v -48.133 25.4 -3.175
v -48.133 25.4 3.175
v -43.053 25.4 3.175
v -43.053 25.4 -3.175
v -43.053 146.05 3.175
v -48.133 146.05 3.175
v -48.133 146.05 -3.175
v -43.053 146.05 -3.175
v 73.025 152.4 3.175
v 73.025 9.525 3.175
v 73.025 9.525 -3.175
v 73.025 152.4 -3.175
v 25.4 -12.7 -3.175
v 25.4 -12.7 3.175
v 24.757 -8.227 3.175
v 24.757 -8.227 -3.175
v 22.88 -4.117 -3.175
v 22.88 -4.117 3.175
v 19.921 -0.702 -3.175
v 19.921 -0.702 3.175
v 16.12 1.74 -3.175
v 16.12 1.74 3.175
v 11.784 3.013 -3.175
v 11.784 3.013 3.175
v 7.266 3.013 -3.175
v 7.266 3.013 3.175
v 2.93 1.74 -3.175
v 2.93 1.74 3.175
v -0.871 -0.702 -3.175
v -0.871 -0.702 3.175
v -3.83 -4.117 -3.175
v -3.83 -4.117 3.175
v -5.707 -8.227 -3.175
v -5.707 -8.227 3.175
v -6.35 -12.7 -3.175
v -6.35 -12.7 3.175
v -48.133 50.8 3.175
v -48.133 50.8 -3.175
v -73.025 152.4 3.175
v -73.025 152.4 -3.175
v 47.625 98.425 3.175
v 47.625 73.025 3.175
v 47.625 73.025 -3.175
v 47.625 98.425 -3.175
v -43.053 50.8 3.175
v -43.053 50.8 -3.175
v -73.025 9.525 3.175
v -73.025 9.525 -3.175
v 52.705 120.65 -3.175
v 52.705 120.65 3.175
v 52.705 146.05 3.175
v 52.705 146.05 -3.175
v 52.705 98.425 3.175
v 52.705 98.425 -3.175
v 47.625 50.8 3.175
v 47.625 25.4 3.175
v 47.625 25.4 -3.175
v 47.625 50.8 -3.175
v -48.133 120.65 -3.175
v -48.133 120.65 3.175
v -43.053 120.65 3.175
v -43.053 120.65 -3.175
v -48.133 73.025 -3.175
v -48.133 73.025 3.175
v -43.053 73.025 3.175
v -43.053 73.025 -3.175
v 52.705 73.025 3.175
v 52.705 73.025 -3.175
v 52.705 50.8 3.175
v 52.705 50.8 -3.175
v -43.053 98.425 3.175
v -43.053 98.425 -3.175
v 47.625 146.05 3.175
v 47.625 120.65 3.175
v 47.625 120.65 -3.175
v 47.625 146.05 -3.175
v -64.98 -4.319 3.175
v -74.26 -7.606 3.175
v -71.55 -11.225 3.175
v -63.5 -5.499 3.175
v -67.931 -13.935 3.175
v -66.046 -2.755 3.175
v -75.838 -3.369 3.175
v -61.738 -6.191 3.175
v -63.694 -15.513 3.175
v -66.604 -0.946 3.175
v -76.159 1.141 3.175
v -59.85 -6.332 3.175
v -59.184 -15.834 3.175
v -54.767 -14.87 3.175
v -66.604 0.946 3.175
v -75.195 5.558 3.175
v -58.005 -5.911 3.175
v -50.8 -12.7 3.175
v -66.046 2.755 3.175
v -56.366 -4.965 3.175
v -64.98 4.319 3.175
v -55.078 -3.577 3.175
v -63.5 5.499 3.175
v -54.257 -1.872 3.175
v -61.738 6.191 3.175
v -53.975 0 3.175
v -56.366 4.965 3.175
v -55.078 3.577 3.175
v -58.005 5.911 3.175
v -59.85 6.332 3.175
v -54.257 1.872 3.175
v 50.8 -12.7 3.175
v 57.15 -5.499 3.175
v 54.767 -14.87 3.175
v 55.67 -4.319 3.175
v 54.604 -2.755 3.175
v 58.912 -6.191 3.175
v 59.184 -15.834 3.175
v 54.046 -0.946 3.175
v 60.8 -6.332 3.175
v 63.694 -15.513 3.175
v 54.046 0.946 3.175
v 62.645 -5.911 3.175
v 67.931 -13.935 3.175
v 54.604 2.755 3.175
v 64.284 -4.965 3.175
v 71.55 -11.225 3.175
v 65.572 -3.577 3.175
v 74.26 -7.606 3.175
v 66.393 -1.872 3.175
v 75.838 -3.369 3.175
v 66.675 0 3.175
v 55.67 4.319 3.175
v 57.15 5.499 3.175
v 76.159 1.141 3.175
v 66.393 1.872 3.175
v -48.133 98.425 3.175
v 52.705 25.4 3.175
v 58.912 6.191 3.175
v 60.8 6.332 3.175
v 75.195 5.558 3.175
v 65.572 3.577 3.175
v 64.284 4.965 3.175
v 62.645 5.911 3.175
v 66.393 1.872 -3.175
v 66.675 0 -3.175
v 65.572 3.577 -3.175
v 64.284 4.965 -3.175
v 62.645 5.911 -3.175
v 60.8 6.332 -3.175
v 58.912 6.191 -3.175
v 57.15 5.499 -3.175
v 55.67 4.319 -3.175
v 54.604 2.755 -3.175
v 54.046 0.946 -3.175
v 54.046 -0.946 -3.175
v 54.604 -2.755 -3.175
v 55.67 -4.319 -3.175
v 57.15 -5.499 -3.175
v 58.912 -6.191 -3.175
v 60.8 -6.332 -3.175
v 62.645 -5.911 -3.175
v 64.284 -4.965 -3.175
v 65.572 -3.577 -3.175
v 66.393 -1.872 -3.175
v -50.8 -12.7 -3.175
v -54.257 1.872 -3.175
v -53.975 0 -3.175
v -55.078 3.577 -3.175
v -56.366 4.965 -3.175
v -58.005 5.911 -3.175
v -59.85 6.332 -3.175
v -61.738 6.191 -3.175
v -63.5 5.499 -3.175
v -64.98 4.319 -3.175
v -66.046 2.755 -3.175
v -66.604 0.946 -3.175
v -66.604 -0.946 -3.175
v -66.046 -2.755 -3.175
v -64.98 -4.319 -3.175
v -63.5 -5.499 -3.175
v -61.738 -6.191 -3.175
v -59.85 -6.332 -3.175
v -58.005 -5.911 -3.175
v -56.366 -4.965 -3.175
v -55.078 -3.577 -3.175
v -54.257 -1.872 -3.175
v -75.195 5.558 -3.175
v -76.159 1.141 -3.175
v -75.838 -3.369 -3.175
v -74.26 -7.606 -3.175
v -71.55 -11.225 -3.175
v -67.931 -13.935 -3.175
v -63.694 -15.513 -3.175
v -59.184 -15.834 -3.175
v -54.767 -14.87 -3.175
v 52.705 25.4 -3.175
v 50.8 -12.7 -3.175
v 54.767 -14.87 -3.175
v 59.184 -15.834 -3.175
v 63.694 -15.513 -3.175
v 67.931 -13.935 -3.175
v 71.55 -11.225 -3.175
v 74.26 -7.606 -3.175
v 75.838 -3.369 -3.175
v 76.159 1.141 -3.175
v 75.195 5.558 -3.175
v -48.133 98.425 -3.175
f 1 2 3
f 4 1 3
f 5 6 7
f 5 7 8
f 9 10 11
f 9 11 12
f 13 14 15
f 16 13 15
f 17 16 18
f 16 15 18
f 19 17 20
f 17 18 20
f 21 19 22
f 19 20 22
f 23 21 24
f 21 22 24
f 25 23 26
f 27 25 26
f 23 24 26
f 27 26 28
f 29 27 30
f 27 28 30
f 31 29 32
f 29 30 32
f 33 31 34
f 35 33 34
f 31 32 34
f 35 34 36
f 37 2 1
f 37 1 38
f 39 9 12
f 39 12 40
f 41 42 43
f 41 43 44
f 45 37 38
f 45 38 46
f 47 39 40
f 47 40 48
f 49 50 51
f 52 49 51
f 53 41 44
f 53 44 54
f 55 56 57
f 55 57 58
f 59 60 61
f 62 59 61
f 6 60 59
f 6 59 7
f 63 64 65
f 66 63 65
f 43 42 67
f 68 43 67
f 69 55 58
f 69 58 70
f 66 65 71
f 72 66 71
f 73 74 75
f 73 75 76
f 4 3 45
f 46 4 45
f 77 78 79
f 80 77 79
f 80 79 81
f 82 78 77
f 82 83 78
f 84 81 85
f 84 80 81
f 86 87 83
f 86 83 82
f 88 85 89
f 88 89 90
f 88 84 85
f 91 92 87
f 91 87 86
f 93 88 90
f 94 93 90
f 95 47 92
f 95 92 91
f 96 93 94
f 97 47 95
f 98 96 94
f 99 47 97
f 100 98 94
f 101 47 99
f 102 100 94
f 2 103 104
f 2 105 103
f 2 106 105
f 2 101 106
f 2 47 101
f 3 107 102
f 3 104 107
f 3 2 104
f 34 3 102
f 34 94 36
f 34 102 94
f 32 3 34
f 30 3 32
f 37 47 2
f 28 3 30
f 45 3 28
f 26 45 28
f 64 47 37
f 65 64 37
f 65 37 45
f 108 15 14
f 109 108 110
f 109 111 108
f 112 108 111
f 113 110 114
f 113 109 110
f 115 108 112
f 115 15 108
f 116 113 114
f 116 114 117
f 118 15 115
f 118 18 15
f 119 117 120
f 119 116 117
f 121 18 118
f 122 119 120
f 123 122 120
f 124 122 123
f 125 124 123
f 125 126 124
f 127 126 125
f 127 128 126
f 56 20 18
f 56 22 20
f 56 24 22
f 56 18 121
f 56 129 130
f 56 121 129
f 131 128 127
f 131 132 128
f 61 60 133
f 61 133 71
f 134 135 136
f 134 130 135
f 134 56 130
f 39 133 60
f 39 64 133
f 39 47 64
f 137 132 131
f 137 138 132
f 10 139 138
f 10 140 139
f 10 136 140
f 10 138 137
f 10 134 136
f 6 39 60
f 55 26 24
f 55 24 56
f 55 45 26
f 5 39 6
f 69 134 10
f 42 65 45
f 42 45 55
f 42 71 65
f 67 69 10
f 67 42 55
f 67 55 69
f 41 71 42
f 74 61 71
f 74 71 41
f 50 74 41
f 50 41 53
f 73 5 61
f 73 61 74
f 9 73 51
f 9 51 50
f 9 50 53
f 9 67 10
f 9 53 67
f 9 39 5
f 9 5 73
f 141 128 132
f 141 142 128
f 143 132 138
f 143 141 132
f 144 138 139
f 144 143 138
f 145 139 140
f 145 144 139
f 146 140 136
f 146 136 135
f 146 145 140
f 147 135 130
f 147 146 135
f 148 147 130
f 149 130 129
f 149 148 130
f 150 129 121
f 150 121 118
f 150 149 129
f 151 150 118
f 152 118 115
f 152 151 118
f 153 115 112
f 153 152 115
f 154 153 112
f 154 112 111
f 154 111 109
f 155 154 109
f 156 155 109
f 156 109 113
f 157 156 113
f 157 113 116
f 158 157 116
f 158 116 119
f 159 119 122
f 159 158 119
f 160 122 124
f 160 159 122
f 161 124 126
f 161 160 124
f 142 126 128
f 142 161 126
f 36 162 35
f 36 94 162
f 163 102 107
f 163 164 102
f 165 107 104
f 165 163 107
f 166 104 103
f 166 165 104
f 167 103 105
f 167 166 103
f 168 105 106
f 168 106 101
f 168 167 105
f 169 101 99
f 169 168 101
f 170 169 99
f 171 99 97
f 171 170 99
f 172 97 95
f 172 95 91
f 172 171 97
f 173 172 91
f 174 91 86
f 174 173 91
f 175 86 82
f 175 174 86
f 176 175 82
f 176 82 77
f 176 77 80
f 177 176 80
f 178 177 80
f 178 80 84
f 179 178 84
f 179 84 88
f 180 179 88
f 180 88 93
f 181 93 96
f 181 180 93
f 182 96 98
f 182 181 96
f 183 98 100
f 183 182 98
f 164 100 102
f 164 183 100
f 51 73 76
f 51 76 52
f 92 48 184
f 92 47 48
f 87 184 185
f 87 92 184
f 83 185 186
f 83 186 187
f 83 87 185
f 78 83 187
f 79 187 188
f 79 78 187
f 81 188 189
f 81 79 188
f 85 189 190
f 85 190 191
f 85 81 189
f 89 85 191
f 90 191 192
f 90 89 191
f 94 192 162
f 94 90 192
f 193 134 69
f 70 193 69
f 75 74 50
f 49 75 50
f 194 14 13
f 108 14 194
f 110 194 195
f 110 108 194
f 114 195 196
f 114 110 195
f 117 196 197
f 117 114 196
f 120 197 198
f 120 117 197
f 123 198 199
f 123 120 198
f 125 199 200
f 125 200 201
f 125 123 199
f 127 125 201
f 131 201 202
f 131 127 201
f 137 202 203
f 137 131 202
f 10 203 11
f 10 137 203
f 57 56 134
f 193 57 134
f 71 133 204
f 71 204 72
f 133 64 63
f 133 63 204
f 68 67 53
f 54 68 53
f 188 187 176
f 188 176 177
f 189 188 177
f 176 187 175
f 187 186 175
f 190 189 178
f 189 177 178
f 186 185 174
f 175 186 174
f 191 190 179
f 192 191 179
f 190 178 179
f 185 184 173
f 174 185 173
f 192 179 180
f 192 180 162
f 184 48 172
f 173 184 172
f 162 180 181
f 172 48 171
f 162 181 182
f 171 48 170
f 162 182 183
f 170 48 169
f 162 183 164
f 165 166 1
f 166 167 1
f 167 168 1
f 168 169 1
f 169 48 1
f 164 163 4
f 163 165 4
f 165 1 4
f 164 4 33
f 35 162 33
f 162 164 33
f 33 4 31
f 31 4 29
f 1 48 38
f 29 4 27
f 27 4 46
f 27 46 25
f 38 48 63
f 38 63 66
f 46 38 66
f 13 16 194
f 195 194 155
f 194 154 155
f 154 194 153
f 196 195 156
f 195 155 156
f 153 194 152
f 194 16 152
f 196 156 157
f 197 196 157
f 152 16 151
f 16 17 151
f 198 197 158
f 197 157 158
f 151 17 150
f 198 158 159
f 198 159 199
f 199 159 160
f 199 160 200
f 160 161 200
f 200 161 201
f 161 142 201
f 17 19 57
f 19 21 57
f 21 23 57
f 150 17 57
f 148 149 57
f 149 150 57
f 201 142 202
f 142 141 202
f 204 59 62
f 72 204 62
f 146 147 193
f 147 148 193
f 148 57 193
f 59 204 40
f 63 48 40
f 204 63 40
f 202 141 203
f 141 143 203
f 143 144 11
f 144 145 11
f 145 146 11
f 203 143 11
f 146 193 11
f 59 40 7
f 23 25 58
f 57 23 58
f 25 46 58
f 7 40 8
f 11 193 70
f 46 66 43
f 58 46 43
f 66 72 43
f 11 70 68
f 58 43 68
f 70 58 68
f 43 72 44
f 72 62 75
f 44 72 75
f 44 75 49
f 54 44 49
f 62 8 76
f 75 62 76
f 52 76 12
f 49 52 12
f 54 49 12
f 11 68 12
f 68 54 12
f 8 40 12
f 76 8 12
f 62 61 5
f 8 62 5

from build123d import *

# Parameters (mm, degrees)
SKETCH1_R           = 6.35
BOSS_EXTRUDE1_DEPTH = 3.175
SKETCH2_W           = 5.08
SKETCH2_H           = 25.4
CUT_EXTRUDE1_DEPTH  = 7.35
SKETCH3_R           = 15.875
CUT_EXTRUDE2_DEPTH  = 7.35


with BuildPart() as part:
    # Sketch1 → Boss-Extrude1 (new body, symmetric)
    with BuildSketch(Plane.XY):
        with BuildLine():
            Line((-0.002676144, -12.7), (0.002676144, -12.7))
            Line((0.002676144, -12.7), (50.8, -12.7))
            ThreePointArc((50.8, -12.7), (71.550320151, -11.225320151), (73.025, 9.525))
            Line((73.025, 9.525), (73.025, 152.4))
            Line((73.025, 152.4), (-73.025, 152.4))
            Line((-73.025, 152.4), (-73.025, 9.525))
            ThreePointArc((-73.025, 9.525), (-71.550320151, -11.225320151), (-50.8, -12.7))
            Line((-50.8, -12.7), (-0.002676144, -12.7))
        make_face()
        with Locations((-60.325, 0)):
            Circle(SKETCH1_R, mode=Mode.SUBTRACT)
        with Locations((60.325, 0)):
            Circle(SKETCH1_R, mode=Mode.SUBTRACT)
    extrude(amount=BOSS_EXTRUDE1_DEPTH, both=True)

    # Sketch2 → Cut-Extrude1 (cut, through all)
    with BuildSketch(Plane.XY.offset(3.175)):
        with Locations((-45.593, 133.35)):
            Rectangle(SKETCH2_W, SKETCH2_H)
        with Locations((-45.593, 85.725)):
            Rectangle(SKETCH2_W, SKETCH2_H)
        with Locations((-45.593, 38.1)):
            Rectangle(SKETCH2_W, SKETCH2_H)
        with Locations((50.165, 133.35)):
            Rectangle(SKETCH2_W, SKETCH2_H)
        with Locations((50.165, 38.1)):
            Rectangle(SKETCH2_W, SKETCH2_H)
        with Locations((50.165, 85.725)):
            Rectangle(SKETCH2_W, SKETCH2_H)
    extrude(amount=-CUT_EXTRUDE1_DEPTH, mode=Mode.SUBTRACT)

    # Sketch3 → Cut-Extrude2 (cut, through all)
    with BuildSketch(Plane.XY.offset(3.175)):
        with Locations((9.525, -12.7)):
            Circle(SKETCH3_R)
    extrude(amount=-CUT_EXTRUDE2_DEPTH, mode=Mode.SUBTRACT)


solid = part.part
